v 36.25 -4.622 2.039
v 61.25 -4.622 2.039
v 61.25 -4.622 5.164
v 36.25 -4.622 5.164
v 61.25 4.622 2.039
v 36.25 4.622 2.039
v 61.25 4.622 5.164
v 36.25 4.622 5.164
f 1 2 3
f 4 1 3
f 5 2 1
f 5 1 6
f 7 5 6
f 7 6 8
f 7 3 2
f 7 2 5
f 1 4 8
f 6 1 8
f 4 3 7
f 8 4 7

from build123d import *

# Parameters (mm, degrees)
F0_W      = 122.5
F0_H      = 57
F1_DEPTH  = 7
F2_R      = 5
F4_W      = 7.9906114999
F4_H      = 3.491573553
F6_DEPTH  = 0.75
F3_R      = 2.8696252626
F3_R_2    = 3.0222724843
F3_W      = 6.7058205605
F3_H      = 3.0176183209
F7_DEPTH  = 0.75
F5_R      = 4.4116461286
F8_DEPTH  = 0.5
F10_W     = 10.931
F10_H     = 2.55831494
F11_DEPTH = 1
F12_R     = 2.4748812048
F13_DEPTH = 7
F14_W     = 9.2436559498
F14_H     = 3.1246161088
F15_DEPTH = 25


# Not quite as in the source:
# - a fillet or chamfer that OpenCascade refuses, or shapes differently, is made with other operations: its cross-section is extruded or revolved along the edge and cut away or added


with BuildPart() as f1:
    # F0 (on Top) → F1 (new body)
    with BuildSketch(Plane.XY):
        Rectangle(F0_W, F0_H)
    extrude(amount=F1_DEPTH)

    # F2
    f2_edges = [f1.edges().sort_by_distance(p)[0] for p in [
        (61.25, -28.5, 3.5),
        (61.25, 28.5, 3.5),
        (-61.25, -28.5, 3.5),
        (-61.25, 28.5, 3.5),
    ]]
    fillet(f2_edges, radius=F2_R)

    # F4 (on face) → F6 (join)
    with BuildSketch(Plane(origin=(-61.25, 0, 0), x_dir=(0, -1, 0), z_dir=(-1, 0, 0))):
        with Locations((-17.3388376055, 3.4486234912)):
            Rectangle(F4_W, F4_H)
    extrude(amount=F6_DEPTH)

    # F3 (on face) → F7 (join)
    with BuildSketch(Plane.XZ.offset(28.5)):
        with Locations((-42.9149009287, 3.2392428257)):
            Circle(F3_R)
        with Locations((-34.8679199815, 3.2392428257)):
            Circle(F3_R_2)
        with Locations((-51.1295311153, 3.2392428257)):
            Rectangle(F3_W, F3_H)
    extrude(amount=F7_DEPTH)

    # F5 (on face) → F8 (cut)
    with BuildSketch(Plane.XY.offset(7)):
        with Locations((54.2597770691, -0.2932948992)):
            Circle(F5_R)
    extrude(amount=-F8_DEPTH, mode=Mode.SUBTRACT)

    # F9: fillet of radius 1 on 1 edges, made by hand


with BuildPart() as f9_tool2:
    # F9_s3 → F9_t4 (revolve)
    with BuildSketch(Plane.XZ.offset(0.2932948992)):
        with BuildLine():
            ThreePointArc((58.6714231977, 7.5), (58.3785299789, 6.7928932188), (57.6714231977, 6.5))
            Line((57.6714231977, 6.5), (58.6714231977, 6.5))
            Line((58.6714231977, 6.5), (58.6714231977, 7.5))
        make_face()
    revolve(axis=Axis((54.2597770691, -0.2932948992, 6.5), (0, 0, 1)))

    split(bisect_by=Plane.XY.offset(7), keep=Keep.BOTTOM)


with BuildPart() as f1_1:
    add(f1.part)

    # F9_t1: union F9_tool2
    add(f9_tool2.part)

    # F10 (on face) → F11 (join)
    with BuildSketch(Plane.YZ.offset(61.25)):
        with Locations((-0.3508040114, 3.4726482118)):
            Rectangle(F10_W, F10_H)
    extrude(amount=-F11_DEPTH)

    # F12 (on face) → F13 (cut)
    with BuildSketch(Plane.YZ.offset(61.25)):
        with Locations((16.8605856597, 3.6920385901)):
            Circle(F12_R)
    extrude(amount=-F13_DEPTH, mode=Mode.SUBTRACT)

    # F14 (on face) → F15 (intersect)
    with BuildSketch(Plane.YZ.offset(61.25)):
        with Locations((0, 3.6012954079)):
            Rectangle(F14_W, F14_H)
    extrude(amount=-F15_DEPTH, mode=Mode.INTERSECT)


solid = f1_1.part
